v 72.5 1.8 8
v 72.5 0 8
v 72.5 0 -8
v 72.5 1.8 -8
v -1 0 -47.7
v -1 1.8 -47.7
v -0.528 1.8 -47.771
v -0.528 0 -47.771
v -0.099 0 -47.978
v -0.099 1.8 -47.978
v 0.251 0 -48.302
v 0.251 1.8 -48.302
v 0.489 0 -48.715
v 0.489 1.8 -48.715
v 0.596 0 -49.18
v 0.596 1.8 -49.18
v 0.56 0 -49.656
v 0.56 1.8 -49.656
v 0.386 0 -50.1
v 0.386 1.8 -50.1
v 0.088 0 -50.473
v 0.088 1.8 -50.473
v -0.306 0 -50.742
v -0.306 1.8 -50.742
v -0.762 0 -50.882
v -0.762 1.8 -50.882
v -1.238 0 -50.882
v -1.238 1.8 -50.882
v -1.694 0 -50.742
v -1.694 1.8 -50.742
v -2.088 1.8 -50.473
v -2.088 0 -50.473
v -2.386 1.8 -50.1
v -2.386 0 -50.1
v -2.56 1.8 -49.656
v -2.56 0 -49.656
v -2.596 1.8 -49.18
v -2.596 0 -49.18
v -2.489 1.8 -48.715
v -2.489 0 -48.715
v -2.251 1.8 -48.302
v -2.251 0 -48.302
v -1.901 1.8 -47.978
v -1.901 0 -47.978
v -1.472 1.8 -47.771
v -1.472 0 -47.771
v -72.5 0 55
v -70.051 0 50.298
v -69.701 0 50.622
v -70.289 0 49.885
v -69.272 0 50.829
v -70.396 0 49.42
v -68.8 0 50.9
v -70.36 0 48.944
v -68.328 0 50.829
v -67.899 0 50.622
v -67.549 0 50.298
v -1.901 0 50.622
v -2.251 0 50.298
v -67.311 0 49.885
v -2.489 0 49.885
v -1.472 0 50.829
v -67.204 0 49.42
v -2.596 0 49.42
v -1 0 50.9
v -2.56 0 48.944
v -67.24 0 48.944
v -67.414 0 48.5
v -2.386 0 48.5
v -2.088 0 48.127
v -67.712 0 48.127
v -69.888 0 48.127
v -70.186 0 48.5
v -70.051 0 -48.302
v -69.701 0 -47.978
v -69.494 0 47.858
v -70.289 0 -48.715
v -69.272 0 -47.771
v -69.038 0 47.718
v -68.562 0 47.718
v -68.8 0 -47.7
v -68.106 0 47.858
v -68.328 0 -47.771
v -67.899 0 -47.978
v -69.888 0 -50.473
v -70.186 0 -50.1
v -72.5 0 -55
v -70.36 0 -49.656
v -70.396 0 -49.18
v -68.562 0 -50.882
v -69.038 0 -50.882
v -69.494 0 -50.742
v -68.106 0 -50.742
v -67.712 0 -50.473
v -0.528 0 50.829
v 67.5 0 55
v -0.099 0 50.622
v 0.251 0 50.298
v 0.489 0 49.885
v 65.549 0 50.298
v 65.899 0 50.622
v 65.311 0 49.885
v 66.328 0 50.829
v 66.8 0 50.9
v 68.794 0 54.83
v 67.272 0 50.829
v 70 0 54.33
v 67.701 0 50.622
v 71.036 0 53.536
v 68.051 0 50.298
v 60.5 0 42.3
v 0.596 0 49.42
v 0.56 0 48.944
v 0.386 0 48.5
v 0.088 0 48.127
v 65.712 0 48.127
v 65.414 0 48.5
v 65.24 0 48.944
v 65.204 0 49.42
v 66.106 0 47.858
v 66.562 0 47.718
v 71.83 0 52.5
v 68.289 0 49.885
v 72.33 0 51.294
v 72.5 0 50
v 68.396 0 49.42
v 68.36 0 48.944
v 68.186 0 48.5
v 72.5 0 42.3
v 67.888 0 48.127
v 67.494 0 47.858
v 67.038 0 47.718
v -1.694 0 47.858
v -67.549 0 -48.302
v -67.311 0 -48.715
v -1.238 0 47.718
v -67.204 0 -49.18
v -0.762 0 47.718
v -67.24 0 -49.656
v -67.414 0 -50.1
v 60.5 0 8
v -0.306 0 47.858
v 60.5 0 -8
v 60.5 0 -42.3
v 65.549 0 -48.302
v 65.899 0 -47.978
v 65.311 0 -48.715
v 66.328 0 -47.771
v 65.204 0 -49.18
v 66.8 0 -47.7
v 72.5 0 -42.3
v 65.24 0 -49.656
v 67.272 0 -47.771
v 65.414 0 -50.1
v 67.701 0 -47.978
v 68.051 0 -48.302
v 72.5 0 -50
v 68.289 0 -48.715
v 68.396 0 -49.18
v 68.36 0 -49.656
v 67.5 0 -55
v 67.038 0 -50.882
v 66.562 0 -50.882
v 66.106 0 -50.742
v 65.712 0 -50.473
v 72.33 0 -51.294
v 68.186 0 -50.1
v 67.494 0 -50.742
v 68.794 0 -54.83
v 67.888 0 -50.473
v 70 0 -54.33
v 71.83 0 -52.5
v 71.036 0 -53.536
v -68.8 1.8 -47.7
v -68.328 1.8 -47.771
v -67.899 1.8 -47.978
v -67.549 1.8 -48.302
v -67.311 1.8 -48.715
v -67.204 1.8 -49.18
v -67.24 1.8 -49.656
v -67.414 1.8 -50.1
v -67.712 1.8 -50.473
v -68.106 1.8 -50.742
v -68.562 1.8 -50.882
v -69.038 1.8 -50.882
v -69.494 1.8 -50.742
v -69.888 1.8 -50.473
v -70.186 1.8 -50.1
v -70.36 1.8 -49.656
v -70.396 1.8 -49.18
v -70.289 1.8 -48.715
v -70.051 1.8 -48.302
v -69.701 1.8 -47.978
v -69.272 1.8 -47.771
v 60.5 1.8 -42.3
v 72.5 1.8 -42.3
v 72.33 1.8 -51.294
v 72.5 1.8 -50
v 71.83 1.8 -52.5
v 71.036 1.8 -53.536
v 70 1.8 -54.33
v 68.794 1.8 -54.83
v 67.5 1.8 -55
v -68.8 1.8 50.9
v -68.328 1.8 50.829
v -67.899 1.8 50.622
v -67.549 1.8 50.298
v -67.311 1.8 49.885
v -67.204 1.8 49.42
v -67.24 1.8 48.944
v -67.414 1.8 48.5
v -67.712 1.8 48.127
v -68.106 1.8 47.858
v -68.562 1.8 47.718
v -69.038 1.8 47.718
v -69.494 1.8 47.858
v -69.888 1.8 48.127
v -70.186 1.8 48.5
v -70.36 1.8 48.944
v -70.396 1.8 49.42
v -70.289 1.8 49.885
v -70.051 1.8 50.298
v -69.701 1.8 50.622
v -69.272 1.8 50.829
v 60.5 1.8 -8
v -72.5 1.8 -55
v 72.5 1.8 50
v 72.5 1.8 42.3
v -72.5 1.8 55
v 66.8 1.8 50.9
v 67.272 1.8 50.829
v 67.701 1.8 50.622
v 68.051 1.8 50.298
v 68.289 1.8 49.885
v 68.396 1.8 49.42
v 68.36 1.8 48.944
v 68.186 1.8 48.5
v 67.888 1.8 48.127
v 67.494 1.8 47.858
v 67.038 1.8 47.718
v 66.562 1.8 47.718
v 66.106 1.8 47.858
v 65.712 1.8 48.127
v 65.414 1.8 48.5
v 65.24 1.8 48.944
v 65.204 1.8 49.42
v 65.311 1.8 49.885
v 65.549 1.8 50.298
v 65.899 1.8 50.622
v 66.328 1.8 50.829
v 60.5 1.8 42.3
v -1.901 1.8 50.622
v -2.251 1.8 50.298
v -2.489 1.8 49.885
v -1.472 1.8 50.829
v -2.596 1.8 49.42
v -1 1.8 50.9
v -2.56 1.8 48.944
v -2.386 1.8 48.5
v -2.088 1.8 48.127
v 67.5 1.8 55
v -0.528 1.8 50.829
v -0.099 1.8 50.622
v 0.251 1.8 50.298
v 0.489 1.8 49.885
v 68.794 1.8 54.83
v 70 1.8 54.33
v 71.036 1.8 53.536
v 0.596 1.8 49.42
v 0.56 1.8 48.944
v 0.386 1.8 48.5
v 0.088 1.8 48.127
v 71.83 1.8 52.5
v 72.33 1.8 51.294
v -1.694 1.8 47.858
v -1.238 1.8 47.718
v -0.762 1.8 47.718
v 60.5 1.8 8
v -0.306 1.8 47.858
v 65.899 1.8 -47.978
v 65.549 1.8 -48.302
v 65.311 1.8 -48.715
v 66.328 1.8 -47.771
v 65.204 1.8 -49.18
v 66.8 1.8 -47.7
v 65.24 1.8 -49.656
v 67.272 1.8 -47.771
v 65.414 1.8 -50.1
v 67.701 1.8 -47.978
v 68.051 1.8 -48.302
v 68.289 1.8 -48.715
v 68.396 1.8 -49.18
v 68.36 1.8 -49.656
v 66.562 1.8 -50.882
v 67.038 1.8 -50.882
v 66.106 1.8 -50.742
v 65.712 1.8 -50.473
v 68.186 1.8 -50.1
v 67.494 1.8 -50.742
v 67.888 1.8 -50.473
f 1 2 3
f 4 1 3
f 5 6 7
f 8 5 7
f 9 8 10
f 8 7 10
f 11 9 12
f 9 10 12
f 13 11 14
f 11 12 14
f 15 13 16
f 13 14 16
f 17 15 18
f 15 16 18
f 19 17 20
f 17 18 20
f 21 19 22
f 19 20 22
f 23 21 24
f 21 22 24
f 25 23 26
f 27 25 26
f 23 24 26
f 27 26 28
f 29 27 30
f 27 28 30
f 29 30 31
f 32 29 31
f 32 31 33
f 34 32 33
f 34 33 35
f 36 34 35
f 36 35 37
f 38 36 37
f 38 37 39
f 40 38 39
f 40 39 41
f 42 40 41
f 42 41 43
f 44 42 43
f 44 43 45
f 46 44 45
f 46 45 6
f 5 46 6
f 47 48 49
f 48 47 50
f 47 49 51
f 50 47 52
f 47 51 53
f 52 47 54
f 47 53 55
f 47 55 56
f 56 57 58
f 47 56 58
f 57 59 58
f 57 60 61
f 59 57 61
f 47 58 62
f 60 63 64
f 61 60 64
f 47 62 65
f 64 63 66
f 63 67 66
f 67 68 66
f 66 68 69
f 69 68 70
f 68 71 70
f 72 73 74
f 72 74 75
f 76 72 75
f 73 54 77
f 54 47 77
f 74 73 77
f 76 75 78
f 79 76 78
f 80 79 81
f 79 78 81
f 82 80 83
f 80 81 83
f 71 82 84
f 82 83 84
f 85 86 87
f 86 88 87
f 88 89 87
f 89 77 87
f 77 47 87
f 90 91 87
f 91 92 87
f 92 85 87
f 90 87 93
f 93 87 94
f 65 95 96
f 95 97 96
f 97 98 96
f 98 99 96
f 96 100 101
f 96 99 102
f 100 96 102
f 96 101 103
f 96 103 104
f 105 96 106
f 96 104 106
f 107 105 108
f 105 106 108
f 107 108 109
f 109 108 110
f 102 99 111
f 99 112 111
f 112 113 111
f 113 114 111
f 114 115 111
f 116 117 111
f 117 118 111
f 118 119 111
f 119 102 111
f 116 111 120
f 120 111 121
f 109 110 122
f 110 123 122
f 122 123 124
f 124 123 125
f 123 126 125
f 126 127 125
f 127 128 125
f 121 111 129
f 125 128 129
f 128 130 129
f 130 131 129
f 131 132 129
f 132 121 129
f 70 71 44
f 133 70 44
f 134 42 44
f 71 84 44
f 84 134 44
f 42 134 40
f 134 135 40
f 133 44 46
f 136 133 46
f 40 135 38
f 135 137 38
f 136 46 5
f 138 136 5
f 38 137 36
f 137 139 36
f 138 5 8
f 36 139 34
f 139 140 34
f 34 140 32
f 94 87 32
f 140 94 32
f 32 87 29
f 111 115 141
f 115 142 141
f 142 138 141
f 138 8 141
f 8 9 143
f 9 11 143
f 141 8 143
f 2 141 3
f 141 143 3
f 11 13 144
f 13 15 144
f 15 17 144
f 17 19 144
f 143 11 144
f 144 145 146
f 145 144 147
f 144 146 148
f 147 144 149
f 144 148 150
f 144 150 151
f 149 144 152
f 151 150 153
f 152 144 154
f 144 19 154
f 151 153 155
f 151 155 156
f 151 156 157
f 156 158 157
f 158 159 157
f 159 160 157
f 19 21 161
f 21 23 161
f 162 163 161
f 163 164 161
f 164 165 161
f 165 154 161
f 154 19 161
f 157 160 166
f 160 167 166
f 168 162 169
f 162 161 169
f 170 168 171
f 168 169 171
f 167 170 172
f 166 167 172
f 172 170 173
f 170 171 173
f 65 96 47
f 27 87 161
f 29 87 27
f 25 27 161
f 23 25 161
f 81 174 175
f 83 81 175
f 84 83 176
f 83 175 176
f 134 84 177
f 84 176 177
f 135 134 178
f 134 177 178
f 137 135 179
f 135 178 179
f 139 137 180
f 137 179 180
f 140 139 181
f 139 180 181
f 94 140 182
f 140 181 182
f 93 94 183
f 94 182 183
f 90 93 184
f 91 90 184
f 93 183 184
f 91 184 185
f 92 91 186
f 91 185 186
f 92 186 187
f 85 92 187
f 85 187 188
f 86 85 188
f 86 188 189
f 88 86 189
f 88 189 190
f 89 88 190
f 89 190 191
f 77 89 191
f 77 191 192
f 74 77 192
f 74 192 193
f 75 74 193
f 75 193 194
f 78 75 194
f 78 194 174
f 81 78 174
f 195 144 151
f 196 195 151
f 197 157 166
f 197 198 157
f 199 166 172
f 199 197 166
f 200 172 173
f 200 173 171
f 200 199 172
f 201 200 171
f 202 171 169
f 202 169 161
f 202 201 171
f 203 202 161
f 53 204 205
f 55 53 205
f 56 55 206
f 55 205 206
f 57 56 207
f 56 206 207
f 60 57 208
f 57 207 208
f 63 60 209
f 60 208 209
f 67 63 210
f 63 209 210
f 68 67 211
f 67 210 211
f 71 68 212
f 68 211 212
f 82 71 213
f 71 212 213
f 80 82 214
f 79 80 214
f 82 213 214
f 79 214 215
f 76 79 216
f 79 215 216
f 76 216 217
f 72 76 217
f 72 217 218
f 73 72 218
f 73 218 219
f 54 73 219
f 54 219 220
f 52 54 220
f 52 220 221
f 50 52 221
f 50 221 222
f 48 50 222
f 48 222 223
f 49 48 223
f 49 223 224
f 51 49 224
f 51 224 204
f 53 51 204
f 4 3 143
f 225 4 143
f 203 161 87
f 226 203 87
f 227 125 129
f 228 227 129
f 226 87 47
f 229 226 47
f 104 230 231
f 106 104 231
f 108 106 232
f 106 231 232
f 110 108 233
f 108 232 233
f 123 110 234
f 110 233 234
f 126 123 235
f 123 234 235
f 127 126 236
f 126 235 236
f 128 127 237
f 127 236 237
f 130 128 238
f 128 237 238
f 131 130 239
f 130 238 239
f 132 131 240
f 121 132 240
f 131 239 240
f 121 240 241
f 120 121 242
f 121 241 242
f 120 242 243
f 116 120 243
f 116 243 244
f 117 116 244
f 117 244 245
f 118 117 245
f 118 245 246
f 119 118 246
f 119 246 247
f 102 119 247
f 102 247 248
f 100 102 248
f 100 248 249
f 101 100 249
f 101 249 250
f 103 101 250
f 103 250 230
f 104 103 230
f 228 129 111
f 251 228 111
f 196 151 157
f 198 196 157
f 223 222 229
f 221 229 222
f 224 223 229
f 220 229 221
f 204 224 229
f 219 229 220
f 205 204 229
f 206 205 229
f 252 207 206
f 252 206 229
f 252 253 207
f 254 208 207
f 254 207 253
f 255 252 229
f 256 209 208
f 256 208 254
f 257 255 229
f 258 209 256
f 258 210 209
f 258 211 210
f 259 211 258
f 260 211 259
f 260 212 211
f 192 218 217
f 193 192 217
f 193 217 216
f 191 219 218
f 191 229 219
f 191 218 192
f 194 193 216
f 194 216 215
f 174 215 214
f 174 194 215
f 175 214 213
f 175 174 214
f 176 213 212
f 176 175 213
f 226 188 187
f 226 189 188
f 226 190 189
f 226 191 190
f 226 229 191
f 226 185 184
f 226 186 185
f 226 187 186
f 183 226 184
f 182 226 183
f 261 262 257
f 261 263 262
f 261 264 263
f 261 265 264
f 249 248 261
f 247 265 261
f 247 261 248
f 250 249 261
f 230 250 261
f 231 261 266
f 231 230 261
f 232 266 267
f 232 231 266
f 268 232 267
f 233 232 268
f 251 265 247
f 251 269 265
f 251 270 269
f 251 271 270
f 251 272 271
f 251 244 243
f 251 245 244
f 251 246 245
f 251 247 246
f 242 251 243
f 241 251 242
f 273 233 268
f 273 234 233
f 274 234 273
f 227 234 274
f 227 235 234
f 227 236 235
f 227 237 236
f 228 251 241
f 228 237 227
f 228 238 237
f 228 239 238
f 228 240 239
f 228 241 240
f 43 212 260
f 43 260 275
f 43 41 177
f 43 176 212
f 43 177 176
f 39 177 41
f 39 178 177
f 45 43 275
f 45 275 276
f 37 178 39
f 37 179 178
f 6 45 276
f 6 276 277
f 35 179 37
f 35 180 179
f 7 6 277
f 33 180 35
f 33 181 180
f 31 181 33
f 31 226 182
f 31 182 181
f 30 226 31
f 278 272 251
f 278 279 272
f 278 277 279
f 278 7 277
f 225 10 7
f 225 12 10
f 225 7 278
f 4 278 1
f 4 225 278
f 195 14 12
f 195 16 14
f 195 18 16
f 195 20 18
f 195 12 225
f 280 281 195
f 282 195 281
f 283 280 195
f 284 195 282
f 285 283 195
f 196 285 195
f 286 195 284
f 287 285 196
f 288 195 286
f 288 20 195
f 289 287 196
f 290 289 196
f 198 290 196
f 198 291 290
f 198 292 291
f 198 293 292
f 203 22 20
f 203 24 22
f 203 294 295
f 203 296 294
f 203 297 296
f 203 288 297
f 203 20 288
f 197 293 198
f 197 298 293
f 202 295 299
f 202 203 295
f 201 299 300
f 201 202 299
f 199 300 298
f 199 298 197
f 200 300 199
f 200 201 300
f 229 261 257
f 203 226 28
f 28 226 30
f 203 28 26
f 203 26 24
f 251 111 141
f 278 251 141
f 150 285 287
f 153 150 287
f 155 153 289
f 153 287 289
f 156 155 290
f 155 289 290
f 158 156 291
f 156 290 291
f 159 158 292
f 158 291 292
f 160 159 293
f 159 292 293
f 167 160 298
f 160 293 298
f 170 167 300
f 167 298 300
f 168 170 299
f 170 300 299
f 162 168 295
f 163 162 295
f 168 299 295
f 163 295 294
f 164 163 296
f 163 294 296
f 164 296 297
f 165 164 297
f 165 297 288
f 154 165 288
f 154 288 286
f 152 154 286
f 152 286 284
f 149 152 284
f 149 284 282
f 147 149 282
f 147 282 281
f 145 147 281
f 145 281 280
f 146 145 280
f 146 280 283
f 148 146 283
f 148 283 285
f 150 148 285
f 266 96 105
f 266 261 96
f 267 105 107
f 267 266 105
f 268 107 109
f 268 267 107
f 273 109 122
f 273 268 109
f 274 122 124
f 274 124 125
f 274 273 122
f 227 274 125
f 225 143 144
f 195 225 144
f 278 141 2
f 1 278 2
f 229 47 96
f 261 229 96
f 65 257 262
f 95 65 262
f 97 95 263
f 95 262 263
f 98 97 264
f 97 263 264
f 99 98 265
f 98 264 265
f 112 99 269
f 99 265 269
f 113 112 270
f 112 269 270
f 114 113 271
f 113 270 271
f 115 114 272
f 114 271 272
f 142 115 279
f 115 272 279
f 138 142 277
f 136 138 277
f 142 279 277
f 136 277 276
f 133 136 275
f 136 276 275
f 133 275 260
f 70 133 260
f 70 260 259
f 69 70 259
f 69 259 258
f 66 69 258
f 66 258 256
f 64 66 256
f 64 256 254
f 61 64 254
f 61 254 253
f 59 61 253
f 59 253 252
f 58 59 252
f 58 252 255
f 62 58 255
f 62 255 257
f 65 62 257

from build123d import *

# Parameters (mm, degrees)
BOSS_EXTRUDE2_DEPTH = 1.8
FILLET1_R           = 5
CUT_EXTRUDE1_REACH  = 93.019
SKETCH3_R           = 1.6


with BuildPart() as part:
    # Sketch2 → Boss-Extrude2 (new body)
    with BuildSketch(Plane(origin=(0, 0, 0), x_dir=(1, 0, 0), z_dir=(0, 1, 0))):
        Polygon((-72.5, -55), (72.5, -55), (72.5, -42.3), (60.5, -42.3), (60.5, -8), (72.5, -8), (72.5, 8), (60.5, 8), (60.5, 42.3), (72.5, 42.3), (72.5, 55), (-72.5, 55), align=None)
    extrude(amount=BOSS_EXTRUDE2_DEPTH)

    # Fillet1
    fillet1_edges = [part.edges().sort_by_distance(p)[0] for p in [
        (72.5, 0.9, 55),
        (72.5, 0.9, -55),
    ]]
    fillet(fillet1_edges, radius=FILLET1_R)

    # Sketch3 → Cut-Extrude1 (cut, up to next)
    with BuildSketch(Plane(origin=(0, 1.8, 0), x_dir=(1, 0, 0), z_dir=(0, 1, 0)), mode=Mode.PRIVATE) as cut_extrude1_sk1:
        with Locations(Location((-68.8, 49.3, 0), (0, 0, 270))):
            Circle(SKETCH3_R)
    cut_extrude1_tool1 = extrude(cut_extrude1_sk1.sketch, amount=-CUT_EXTRUDE1_REACH, mode=Mode.PRIVATE) & part.part
    # Sketch3 → Cut-Extrude1 (cut, up to next)
    with BuildSketch(Plane(origin=(0, 1.8, 0), x_dir=(1, 0, 0), z_dir=(0, 1, 0)), mode=Mode.PRIVATE) as cut_extrude1_sk2:
        with Locations(Location((-1, 49.3, 0), (0, 0, 270))):
            Circle(SKETCH3_R)
    cut_extrude1_tool2 = extrude(cut_extrude1_sk2.sketch, amount=-CUT_EXTRUDE1_REACH, mode=Mode.PRIVATE) & part.part
    # Sketch3 → Cut-Extrude1 (cut, up to next)
    with BuildSketch(Plane(origin=(0, 1.8, 0), x_dir=(1, 0, 0), z_dir=(0, 1, 0)), mode=Mode.PRIVATE) as cut_extrude1_sk3:
        with Locations(Location((-1, -49.3, 0), (0, 0, 270))):
            Circle(SKETCH3_R)
    cut_extrude1_tool3 = extrude(cut_extrude1_sk3.sketch, amount=-CUT_EXTRUDE1_REACH, mode=Mode.PRIVATE) & part.part
    # Sketch3 → Cut-Extrude1 (cut, up to next)
    with BuildSketch(Plane(origin=(0, 1.8, 0), x_dir=(1, 0, 0), z_dir=(0, 1, 0)), mode=Mode.PRIVATE) as cut_extrude1_sk4:
        with Locations(Location((-68.8, -49.3, 0), (0, 0, 270))):
            Circle(SKETCH3_R)
    cut_extrude1_tool4 = extrude(cut_extrude1_sk4.sketch, amount=-CUT_EXTRUDE1_REACH, mode=Mode.PRIVATE) & part.part
    # Sketch3 → Cut-Extrude1 (cut, up to next)
    with BuildSketch(Plane(origin=(0, 1.8, 0), x_dir=(1, 0, 0), z_dir=(0, 1, 0)), mode=Mode.PRIVATE) as cut_extrude1_sk5:
        with Locations(Location((66.8, 49.3, 0), (0, 0, 270))):
            Circle(SKETCH3_R)
    cut_extrude1_tool5 = extrude(cut_extrude1_sk5.sketch, amount=-CUT_EXTRUDE1_REACH, mode=Mode.PRIVATE) & part.part
    # Sketch3 → Cut-Extrude1 (cut, up to next)
    with BuildSketch(Plane(origin=(0, 1.8, 0), x_dir=(1, 0, 0), z_dir=(0, 1, 0)), mode=Mode.PRIVATE) as cut_extrude1_sk6:
        with Locations(Location((66.8, -49.3, 0), (0, 0, 270))):
            Circle(SKETCH3_R)
    cut_extrude1_tool6 = extrude(cut_extrude1_sk6.sketch, amount=-CUT_EXTRUDE1_REACH, mode=Mode.PRIVATE) & part.part
    add(cut_extrude1_tool1.solids().sort_by_distance((-68.8, 1.8, -49.3))[0], mode=Mode.SUBTRACT)
    add(cut_extrude1_tool2.solids().sort_by_distance((-1, 1.8, -49.3))[0], mode=Mode.SUBTRACT)
    add(cut_extrude1_tool3.solids().sort_by_distance((-1, 1.8, 49.3))[0], mode=Mode.SUBTRACT)
    add(cut_extrude1_tool4.solids().sort_by_distance((-68.8, 1.8, 49.3))[0], mode=Mode.SUBTRACT)
    add(cut_extrude1_tool5.solids().sort_by_distance((66.8, 1.8, -49.3))[0], mode=Mode.SUBTRACT)
    add(cut_extrude1_tool6.solids().sort_by_distance((66.8, 1.8, 49.3))[0], mode=Mode.SUBTRACT)


solid = part.part
